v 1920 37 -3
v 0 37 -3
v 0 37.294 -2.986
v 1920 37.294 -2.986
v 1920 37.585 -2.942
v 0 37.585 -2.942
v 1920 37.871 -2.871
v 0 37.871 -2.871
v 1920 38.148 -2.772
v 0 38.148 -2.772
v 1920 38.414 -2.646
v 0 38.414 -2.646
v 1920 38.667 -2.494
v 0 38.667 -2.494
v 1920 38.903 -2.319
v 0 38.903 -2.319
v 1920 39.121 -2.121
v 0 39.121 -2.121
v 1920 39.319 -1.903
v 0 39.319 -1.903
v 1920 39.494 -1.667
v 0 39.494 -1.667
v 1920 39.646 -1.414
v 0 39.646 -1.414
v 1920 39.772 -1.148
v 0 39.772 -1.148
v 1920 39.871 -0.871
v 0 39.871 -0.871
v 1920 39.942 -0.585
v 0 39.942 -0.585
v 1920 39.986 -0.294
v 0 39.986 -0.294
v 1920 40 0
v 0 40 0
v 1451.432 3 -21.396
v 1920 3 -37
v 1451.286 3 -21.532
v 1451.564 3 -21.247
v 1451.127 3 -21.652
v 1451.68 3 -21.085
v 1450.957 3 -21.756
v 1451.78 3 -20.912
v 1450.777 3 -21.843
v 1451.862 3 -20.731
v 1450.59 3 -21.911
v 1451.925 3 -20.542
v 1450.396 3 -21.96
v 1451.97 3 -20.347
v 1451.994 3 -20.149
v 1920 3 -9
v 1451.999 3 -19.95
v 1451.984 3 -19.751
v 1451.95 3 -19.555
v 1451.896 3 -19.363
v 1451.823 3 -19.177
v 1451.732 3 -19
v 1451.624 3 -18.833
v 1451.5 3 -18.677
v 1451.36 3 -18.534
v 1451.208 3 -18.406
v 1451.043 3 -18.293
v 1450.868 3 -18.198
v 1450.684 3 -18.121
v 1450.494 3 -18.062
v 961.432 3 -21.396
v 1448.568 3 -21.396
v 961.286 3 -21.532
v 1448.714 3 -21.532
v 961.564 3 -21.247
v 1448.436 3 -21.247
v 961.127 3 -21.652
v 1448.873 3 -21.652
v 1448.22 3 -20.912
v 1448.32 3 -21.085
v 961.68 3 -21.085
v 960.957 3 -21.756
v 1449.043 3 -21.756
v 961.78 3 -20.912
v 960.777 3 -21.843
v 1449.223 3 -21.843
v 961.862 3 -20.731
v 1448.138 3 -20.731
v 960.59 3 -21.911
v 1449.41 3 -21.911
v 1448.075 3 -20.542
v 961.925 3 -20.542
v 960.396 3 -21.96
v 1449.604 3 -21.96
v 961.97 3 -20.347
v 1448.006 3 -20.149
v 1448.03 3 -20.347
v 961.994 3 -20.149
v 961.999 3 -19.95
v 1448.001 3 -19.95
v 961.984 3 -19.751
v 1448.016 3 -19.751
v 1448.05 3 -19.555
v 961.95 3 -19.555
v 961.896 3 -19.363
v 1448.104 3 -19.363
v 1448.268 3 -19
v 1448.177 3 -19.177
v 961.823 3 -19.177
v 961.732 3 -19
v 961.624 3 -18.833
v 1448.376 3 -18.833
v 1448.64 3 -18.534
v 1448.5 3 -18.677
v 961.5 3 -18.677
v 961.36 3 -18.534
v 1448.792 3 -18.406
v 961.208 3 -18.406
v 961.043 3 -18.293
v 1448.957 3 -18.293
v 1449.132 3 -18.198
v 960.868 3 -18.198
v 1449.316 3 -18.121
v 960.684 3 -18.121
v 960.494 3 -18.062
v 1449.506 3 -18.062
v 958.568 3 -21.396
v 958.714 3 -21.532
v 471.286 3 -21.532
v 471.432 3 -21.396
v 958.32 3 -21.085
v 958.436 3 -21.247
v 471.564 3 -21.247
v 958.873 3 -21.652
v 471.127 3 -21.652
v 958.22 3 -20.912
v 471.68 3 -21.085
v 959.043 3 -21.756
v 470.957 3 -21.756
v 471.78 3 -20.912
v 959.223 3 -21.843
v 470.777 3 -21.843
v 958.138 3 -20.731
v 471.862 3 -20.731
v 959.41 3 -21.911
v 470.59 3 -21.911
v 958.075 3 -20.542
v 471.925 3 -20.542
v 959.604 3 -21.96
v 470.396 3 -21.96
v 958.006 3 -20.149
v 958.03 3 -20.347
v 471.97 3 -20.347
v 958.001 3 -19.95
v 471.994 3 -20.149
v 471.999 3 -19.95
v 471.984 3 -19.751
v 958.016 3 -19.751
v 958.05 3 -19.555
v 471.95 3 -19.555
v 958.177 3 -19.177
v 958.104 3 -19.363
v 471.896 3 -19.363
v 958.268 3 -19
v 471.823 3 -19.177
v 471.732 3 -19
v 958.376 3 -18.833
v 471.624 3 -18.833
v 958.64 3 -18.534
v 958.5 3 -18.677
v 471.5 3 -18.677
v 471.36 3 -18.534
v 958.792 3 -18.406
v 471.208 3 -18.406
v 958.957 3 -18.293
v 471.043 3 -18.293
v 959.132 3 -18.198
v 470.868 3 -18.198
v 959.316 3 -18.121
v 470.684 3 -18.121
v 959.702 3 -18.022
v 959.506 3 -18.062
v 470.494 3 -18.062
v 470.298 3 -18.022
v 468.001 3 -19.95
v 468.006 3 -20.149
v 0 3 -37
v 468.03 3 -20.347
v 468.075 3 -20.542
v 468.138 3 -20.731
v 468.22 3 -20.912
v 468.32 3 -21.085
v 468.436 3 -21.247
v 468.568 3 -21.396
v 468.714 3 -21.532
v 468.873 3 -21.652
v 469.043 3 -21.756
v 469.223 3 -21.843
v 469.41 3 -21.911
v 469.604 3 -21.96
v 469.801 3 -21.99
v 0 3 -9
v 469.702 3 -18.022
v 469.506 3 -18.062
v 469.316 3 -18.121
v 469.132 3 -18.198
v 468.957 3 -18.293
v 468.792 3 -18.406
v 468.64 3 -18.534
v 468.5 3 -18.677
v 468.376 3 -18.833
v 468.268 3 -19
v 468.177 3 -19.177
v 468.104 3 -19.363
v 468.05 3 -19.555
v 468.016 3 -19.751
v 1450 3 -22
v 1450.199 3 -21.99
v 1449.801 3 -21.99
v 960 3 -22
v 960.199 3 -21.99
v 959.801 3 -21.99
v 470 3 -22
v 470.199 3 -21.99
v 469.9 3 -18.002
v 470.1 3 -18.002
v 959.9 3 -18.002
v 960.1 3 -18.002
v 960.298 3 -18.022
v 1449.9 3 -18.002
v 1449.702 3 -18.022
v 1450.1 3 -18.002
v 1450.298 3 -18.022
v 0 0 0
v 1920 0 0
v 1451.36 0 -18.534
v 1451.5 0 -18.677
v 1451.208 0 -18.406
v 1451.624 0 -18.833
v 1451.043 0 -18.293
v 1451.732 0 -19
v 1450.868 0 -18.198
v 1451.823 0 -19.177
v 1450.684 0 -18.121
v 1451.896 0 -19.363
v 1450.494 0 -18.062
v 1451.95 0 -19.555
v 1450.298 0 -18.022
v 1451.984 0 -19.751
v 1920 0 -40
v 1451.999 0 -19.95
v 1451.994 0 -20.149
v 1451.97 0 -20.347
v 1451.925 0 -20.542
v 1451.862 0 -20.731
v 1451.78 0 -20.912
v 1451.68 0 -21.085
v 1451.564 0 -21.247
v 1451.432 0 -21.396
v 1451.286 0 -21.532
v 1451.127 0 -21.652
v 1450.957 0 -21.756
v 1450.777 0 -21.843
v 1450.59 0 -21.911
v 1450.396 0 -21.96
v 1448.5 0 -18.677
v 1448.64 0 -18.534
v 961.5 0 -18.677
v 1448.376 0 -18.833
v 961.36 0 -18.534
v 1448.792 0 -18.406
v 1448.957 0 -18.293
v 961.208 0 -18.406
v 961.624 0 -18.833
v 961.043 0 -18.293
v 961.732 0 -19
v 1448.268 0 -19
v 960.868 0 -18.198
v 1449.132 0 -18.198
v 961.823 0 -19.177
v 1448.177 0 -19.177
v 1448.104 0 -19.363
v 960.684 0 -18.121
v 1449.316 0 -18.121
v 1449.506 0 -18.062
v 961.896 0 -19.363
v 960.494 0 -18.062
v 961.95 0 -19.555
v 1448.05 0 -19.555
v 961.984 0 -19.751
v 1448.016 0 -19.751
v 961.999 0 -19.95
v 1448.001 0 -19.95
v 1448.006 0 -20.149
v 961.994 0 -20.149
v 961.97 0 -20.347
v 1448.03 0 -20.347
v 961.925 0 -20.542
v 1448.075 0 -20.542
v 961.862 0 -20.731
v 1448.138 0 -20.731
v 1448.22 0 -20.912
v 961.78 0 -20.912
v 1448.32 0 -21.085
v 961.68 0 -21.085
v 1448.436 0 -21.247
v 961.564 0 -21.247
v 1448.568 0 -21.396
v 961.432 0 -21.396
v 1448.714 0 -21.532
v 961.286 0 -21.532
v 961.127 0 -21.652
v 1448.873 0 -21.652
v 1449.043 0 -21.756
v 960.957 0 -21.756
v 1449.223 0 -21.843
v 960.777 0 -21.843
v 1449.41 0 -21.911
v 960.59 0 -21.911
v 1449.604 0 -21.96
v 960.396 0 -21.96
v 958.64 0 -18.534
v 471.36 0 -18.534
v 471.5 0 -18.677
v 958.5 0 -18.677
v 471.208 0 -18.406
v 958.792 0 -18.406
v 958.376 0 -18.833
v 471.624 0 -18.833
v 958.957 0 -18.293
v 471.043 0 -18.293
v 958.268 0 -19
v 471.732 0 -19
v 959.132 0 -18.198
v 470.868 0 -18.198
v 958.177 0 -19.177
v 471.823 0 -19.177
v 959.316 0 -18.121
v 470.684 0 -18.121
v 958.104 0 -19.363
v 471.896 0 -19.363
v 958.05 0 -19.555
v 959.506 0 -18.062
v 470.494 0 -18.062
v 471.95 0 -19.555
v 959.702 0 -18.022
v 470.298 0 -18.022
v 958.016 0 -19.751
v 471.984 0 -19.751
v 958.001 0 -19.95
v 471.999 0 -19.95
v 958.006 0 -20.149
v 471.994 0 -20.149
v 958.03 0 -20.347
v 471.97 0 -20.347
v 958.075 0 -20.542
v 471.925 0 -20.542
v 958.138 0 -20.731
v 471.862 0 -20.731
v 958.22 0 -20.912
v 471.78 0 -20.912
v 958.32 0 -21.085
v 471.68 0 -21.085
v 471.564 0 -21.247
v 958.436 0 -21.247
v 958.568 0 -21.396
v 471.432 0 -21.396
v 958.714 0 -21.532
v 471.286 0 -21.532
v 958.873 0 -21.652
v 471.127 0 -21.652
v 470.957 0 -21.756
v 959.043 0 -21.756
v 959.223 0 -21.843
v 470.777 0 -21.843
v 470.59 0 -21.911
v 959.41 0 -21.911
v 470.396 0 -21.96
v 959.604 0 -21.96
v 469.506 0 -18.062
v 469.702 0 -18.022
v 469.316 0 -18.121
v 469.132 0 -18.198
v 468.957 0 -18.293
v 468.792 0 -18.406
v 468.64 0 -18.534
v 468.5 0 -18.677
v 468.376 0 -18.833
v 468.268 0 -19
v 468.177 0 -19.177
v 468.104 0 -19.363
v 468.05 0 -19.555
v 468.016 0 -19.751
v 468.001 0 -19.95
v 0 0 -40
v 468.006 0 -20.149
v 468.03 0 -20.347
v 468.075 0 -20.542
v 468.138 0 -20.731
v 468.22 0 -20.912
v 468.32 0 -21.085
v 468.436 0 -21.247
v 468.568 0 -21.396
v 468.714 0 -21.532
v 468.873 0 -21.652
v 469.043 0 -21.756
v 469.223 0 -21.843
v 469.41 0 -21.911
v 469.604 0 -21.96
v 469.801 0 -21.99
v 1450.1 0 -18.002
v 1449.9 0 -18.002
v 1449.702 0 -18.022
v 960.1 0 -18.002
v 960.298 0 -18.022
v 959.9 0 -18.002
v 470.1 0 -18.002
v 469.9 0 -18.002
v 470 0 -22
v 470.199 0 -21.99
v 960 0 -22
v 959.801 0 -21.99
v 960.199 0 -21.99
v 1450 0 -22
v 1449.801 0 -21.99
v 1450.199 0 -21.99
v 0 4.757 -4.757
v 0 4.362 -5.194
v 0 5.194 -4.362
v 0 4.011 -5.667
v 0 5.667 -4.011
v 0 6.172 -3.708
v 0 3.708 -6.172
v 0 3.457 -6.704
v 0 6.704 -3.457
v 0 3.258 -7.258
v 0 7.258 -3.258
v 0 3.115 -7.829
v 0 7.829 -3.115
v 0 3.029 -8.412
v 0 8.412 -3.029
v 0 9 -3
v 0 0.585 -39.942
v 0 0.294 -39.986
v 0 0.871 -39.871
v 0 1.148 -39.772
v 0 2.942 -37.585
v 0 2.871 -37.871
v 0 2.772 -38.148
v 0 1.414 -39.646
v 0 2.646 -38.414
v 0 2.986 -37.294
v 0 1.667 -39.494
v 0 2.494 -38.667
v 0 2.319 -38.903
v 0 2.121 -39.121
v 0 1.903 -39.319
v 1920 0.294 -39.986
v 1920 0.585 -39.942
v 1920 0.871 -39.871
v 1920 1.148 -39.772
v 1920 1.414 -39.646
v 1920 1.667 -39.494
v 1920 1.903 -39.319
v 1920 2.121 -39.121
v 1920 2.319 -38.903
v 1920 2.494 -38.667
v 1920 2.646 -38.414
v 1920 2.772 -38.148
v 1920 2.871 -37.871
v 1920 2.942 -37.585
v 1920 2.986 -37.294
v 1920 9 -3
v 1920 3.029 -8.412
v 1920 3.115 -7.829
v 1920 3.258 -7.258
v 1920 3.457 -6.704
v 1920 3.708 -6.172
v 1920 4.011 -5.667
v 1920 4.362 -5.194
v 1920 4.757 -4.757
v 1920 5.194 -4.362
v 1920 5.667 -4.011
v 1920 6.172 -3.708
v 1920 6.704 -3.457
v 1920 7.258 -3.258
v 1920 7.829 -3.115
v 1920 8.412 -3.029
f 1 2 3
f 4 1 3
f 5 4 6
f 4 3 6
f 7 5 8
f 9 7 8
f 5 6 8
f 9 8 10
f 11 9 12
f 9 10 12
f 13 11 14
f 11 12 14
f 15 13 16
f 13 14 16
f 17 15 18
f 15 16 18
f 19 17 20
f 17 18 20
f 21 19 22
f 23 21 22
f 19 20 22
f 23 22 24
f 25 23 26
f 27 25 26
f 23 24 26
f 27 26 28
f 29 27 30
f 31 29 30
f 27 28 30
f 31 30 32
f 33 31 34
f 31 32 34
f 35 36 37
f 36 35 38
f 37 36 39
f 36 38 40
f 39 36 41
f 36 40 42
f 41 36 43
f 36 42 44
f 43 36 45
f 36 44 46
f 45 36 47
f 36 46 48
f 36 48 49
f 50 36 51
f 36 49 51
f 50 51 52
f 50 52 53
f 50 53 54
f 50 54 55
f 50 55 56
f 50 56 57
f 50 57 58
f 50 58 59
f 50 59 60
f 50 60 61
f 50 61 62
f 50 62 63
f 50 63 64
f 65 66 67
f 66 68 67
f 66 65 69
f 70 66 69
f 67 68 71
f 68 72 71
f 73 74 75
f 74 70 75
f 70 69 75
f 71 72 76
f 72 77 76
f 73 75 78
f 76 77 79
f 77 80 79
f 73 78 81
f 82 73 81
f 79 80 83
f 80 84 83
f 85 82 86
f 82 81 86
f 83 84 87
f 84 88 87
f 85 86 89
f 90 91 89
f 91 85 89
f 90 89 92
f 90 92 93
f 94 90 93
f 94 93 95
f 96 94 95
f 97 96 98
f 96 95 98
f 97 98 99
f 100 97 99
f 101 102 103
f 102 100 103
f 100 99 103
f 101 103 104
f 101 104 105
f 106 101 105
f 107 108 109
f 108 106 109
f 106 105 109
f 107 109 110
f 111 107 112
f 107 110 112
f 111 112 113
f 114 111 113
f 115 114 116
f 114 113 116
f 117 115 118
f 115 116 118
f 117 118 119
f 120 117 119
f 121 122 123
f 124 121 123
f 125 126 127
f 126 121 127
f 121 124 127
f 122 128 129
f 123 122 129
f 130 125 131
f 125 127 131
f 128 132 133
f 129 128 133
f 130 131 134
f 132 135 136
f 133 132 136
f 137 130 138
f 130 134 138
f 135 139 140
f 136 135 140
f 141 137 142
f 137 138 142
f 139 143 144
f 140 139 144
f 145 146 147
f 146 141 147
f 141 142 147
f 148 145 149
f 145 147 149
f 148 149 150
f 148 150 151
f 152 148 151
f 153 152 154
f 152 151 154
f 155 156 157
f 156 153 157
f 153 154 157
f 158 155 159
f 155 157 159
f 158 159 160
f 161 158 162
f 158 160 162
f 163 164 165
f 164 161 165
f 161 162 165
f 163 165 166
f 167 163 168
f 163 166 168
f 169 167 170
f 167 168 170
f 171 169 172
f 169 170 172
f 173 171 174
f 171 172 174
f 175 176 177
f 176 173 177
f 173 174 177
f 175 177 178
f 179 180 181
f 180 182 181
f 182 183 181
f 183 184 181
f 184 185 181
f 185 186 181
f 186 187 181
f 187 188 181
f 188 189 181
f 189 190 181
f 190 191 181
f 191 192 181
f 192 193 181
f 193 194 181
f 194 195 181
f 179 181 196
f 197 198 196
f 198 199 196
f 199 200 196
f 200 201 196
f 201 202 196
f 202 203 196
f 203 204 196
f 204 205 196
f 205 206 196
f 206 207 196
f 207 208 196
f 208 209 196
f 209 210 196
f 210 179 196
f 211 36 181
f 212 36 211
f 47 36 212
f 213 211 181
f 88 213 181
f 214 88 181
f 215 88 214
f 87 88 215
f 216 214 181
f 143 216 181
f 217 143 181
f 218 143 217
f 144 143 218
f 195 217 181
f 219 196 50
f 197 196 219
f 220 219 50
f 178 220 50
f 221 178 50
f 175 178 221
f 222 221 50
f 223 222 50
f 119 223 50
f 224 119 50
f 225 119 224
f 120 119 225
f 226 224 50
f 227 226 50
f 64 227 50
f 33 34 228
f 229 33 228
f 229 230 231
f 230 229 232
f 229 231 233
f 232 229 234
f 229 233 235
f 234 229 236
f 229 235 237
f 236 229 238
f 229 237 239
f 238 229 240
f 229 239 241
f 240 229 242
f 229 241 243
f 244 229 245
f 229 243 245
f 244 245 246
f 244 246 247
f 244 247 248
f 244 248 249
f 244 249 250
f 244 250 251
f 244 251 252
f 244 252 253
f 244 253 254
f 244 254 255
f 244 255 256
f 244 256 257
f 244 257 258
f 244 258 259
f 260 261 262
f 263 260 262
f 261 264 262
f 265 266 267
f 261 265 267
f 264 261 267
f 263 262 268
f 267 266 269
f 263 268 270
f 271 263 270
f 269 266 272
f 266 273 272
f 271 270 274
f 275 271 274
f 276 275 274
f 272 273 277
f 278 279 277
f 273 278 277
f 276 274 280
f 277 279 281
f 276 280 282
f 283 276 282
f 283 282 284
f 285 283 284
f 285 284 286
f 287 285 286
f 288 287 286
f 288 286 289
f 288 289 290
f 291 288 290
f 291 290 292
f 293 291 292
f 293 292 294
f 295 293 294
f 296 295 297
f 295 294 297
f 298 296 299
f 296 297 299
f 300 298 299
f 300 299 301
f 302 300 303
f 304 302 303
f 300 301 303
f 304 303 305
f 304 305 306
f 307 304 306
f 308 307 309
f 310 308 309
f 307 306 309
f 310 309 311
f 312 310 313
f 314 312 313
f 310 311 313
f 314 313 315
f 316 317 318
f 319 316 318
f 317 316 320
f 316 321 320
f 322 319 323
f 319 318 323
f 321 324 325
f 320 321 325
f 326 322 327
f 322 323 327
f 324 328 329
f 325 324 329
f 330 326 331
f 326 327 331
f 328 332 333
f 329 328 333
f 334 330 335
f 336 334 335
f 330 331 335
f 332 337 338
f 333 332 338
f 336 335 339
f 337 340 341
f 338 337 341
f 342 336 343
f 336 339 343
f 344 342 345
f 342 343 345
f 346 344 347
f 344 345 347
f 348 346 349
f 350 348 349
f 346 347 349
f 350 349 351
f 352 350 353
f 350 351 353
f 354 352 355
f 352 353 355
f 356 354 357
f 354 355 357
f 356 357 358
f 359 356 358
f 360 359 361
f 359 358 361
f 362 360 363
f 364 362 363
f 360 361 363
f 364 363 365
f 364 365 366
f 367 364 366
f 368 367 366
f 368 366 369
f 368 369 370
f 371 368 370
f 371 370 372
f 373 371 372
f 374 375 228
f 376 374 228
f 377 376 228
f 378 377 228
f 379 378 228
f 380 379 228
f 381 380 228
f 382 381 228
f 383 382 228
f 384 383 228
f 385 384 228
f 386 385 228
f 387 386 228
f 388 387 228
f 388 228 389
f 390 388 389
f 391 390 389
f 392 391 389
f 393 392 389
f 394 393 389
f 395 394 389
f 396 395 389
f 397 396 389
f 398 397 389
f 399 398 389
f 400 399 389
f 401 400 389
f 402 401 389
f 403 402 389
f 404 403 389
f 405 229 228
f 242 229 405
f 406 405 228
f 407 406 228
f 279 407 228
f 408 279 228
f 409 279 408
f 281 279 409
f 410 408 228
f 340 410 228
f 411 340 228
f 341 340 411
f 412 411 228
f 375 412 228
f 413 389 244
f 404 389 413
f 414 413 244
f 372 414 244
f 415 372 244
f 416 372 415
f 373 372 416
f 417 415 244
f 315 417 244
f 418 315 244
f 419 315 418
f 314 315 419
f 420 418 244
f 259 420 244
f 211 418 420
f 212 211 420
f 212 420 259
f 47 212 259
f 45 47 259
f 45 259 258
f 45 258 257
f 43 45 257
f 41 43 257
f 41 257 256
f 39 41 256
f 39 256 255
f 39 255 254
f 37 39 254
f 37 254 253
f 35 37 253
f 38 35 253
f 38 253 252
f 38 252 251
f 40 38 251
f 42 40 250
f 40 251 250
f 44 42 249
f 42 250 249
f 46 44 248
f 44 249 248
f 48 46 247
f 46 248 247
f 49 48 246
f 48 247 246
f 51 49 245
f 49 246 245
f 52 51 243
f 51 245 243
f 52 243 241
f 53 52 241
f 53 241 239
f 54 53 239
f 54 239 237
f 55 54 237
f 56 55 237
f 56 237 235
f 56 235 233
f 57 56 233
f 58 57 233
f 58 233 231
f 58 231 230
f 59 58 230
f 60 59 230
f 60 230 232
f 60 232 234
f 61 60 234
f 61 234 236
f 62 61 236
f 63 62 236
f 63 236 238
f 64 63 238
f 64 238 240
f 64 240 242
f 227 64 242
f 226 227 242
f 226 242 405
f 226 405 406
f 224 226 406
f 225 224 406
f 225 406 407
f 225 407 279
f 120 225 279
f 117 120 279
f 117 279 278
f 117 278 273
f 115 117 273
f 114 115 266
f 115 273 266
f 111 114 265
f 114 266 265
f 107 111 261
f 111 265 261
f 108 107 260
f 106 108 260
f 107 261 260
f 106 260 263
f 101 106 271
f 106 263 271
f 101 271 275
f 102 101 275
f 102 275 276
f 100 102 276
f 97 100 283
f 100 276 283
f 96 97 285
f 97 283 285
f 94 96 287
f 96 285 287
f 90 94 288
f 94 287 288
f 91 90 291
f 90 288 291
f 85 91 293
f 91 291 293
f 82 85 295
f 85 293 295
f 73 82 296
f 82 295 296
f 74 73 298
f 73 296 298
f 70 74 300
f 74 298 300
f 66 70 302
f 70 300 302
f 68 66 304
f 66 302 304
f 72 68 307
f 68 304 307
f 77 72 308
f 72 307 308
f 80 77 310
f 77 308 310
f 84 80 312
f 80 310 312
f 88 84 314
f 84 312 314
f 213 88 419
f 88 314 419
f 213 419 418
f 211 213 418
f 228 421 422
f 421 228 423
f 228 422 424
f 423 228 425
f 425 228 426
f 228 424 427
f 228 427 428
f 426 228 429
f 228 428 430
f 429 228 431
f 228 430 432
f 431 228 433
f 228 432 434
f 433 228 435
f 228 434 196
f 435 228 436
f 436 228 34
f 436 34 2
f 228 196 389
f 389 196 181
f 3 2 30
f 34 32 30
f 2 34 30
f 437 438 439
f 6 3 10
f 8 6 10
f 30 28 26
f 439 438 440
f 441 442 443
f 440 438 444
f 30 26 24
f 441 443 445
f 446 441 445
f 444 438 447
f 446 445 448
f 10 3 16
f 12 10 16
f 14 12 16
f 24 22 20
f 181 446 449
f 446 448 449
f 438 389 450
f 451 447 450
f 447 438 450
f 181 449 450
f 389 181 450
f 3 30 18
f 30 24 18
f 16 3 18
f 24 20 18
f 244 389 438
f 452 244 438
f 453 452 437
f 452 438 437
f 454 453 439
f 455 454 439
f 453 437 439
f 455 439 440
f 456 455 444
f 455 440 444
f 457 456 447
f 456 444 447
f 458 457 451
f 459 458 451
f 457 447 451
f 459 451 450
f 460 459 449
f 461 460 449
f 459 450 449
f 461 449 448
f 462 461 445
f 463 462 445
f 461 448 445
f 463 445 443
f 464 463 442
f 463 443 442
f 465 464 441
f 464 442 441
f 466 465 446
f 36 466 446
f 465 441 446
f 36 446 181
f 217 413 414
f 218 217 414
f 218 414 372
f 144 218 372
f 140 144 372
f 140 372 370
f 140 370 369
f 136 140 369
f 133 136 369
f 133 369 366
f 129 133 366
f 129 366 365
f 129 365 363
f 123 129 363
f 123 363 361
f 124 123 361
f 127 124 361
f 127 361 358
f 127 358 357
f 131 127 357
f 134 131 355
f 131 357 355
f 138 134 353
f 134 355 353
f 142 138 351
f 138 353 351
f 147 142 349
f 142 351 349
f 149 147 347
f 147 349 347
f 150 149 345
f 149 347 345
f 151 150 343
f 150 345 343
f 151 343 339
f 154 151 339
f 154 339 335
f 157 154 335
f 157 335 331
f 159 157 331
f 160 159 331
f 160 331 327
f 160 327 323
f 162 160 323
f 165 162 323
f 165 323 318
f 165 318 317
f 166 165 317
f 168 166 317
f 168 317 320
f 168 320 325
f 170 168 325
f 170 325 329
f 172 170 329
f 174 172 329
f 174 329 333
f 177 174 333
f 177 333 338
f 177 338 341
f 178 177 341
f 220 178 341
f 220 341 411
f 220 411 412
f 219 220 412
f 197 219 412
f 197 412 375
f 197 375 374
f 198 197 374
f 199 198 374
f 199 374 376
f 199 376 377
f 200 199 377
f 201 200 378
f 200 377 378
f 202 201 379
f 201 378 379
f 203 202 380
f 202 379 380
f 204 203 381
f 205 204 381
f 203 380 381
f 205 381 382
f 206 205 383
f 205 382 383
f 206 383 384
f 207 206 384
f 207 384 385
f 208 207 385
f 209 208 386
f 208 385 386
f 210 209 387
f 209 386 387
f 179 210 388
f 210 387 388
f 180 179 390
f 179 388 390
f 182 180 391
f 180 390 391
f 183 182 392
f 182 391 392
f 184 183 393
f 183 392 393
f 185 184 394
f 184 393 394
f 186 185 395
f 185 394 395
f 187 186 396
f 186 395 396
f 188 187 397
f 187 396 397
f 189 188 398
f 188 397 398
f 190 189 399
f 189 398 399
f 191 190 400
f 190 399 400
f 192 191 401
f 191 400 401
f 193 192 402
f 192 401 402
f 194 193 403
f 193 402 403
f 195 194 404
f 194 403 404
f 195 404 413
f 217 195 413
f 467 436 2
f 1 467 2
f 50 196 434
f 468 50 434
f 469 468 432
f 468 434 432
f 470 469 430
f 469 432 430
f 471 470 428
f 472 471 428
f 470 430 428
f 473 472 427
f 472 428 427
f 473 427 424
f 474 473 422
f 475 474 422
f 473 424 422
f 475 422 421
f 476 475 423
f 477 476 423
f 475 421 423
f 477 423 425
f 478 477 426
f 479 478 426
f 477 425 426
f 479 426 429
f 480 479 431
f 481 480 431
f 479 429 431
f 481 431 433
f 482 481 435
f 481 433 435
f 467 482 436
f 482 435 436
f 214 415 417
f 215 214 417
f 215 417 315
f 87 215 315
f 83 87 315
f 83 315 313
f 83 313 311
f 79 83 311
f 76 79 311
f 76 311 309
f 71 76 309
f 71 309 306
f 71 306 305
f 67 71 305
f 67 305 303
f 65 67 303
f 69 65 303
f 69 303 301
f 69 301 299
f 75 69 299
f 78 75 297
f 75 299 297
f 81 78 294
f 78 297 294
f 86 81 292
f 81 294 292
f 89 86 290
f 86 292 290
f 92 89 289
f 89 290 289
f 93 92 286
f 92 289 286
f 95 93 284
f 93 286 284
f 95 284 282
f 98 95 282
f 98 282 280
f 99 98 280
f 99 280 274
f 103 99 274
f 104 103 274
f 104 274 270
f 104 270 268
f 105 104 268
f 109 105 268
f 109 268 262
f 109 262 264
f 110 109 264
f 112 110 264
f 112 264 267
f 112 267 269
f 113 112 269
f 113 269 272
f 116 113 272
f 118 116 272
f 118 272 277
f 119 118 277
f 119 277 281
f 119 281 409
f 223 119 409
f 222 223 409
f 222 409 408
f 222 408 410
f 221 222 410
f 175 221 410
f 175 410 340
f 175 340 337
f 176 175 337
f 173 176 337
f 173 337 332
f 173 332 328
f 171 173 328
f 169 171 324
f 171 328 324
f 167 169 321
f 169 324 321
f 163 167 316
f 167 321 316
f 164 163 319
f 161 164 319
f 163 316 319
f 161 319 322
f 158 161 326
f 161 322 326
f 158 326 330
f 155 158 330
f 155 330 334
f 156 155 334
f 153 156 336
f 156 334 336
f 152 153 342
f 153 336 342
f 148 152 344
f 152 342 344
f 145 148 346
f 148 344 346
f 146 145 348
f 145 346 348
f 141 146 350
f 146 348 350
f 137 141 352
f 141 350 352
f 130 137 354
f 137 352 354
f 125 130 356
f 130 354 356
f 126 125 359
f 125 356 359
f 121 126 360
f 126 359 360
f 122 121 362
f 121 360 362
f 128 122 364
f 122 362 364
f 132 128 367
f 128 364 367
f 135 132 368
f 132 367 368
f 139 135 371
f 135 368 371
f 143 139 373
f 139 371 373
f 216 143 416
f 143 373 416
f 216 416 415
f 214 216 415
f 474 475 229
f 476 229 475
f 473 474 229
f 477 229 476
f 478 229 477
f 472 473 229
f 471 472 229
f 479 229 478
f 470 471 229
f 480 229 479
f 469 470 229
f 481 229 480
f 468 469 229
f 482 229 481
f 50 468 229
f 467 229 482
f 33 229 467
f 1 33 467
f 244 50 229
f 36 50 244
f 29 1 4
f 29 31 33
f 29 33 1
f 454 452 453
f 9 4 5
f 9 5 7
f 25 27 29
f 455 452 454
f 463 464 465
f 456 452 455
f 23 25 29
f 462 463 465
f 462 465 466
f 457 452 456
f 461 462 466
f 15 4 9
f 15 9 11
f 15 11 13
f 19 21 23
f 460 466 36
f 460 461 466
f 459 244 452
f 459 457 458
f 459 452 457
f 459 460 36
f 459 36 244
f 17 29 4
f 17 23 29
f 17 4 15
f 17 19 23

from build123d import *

# Parameters (mm, degrees)
L_ANGLE_EQUAL_40X40X3_2_DEPTH = 1920
SKETCH15_R                    = 2
CUT_EXTRUDE1_DEPTH            = 10


with BuildPart() as part:
    # Sketch13 → L angle (equal) 40X40X3(2) (new body)
    with BuildSketch(Plane(origin=(0, 0, 0), x_dir=(0, 0, -1), z_dir=(1, 0, 0))):
        with BuildLine():
            Line((0, 40), (0, 0))
            Line((0, 0), (40, 0))
            ThreePointArc((40, 0), (39.121320344, 2.121320344), (37, 3))
            Line((37, 3), (9, 3))
            ThreePointArc((9, 3), (4.757359313, 4.757359313), (3, 9))
            Line((3, 9), (3, 37))
            ThreePointArc((3, 37), (2.121320344, 39.121320344), (0, 40))
        make_face()
    extrude(amount=L_ANGLE_EQUAL_40X40X3_2_DEPTH)

    # Sketch15 → Cut-Extrude1 (cut)
    with BuildSketch(Plane(origin=(0, 0, 0), x_dir=(-1, 0, 0), z_dir=(0, -1, 0))):
        with Locations(Location((-960, 20, 0), (0, 0, 90))):
            Circle(SKETCH15_R)
        with Locations(Location((-470, 20, 0), (0, 0, 90))):
            Circle(SKETCH15_R)
        with Locations(Location((-1450, 20, 0), (0, 0, 90))):
            Circle(SKETCH15_R)
    extrude(amount=-CUT_EXTRUDE1_DEPTH, mode=Mode.SUBTRACT)


solid = part.part
